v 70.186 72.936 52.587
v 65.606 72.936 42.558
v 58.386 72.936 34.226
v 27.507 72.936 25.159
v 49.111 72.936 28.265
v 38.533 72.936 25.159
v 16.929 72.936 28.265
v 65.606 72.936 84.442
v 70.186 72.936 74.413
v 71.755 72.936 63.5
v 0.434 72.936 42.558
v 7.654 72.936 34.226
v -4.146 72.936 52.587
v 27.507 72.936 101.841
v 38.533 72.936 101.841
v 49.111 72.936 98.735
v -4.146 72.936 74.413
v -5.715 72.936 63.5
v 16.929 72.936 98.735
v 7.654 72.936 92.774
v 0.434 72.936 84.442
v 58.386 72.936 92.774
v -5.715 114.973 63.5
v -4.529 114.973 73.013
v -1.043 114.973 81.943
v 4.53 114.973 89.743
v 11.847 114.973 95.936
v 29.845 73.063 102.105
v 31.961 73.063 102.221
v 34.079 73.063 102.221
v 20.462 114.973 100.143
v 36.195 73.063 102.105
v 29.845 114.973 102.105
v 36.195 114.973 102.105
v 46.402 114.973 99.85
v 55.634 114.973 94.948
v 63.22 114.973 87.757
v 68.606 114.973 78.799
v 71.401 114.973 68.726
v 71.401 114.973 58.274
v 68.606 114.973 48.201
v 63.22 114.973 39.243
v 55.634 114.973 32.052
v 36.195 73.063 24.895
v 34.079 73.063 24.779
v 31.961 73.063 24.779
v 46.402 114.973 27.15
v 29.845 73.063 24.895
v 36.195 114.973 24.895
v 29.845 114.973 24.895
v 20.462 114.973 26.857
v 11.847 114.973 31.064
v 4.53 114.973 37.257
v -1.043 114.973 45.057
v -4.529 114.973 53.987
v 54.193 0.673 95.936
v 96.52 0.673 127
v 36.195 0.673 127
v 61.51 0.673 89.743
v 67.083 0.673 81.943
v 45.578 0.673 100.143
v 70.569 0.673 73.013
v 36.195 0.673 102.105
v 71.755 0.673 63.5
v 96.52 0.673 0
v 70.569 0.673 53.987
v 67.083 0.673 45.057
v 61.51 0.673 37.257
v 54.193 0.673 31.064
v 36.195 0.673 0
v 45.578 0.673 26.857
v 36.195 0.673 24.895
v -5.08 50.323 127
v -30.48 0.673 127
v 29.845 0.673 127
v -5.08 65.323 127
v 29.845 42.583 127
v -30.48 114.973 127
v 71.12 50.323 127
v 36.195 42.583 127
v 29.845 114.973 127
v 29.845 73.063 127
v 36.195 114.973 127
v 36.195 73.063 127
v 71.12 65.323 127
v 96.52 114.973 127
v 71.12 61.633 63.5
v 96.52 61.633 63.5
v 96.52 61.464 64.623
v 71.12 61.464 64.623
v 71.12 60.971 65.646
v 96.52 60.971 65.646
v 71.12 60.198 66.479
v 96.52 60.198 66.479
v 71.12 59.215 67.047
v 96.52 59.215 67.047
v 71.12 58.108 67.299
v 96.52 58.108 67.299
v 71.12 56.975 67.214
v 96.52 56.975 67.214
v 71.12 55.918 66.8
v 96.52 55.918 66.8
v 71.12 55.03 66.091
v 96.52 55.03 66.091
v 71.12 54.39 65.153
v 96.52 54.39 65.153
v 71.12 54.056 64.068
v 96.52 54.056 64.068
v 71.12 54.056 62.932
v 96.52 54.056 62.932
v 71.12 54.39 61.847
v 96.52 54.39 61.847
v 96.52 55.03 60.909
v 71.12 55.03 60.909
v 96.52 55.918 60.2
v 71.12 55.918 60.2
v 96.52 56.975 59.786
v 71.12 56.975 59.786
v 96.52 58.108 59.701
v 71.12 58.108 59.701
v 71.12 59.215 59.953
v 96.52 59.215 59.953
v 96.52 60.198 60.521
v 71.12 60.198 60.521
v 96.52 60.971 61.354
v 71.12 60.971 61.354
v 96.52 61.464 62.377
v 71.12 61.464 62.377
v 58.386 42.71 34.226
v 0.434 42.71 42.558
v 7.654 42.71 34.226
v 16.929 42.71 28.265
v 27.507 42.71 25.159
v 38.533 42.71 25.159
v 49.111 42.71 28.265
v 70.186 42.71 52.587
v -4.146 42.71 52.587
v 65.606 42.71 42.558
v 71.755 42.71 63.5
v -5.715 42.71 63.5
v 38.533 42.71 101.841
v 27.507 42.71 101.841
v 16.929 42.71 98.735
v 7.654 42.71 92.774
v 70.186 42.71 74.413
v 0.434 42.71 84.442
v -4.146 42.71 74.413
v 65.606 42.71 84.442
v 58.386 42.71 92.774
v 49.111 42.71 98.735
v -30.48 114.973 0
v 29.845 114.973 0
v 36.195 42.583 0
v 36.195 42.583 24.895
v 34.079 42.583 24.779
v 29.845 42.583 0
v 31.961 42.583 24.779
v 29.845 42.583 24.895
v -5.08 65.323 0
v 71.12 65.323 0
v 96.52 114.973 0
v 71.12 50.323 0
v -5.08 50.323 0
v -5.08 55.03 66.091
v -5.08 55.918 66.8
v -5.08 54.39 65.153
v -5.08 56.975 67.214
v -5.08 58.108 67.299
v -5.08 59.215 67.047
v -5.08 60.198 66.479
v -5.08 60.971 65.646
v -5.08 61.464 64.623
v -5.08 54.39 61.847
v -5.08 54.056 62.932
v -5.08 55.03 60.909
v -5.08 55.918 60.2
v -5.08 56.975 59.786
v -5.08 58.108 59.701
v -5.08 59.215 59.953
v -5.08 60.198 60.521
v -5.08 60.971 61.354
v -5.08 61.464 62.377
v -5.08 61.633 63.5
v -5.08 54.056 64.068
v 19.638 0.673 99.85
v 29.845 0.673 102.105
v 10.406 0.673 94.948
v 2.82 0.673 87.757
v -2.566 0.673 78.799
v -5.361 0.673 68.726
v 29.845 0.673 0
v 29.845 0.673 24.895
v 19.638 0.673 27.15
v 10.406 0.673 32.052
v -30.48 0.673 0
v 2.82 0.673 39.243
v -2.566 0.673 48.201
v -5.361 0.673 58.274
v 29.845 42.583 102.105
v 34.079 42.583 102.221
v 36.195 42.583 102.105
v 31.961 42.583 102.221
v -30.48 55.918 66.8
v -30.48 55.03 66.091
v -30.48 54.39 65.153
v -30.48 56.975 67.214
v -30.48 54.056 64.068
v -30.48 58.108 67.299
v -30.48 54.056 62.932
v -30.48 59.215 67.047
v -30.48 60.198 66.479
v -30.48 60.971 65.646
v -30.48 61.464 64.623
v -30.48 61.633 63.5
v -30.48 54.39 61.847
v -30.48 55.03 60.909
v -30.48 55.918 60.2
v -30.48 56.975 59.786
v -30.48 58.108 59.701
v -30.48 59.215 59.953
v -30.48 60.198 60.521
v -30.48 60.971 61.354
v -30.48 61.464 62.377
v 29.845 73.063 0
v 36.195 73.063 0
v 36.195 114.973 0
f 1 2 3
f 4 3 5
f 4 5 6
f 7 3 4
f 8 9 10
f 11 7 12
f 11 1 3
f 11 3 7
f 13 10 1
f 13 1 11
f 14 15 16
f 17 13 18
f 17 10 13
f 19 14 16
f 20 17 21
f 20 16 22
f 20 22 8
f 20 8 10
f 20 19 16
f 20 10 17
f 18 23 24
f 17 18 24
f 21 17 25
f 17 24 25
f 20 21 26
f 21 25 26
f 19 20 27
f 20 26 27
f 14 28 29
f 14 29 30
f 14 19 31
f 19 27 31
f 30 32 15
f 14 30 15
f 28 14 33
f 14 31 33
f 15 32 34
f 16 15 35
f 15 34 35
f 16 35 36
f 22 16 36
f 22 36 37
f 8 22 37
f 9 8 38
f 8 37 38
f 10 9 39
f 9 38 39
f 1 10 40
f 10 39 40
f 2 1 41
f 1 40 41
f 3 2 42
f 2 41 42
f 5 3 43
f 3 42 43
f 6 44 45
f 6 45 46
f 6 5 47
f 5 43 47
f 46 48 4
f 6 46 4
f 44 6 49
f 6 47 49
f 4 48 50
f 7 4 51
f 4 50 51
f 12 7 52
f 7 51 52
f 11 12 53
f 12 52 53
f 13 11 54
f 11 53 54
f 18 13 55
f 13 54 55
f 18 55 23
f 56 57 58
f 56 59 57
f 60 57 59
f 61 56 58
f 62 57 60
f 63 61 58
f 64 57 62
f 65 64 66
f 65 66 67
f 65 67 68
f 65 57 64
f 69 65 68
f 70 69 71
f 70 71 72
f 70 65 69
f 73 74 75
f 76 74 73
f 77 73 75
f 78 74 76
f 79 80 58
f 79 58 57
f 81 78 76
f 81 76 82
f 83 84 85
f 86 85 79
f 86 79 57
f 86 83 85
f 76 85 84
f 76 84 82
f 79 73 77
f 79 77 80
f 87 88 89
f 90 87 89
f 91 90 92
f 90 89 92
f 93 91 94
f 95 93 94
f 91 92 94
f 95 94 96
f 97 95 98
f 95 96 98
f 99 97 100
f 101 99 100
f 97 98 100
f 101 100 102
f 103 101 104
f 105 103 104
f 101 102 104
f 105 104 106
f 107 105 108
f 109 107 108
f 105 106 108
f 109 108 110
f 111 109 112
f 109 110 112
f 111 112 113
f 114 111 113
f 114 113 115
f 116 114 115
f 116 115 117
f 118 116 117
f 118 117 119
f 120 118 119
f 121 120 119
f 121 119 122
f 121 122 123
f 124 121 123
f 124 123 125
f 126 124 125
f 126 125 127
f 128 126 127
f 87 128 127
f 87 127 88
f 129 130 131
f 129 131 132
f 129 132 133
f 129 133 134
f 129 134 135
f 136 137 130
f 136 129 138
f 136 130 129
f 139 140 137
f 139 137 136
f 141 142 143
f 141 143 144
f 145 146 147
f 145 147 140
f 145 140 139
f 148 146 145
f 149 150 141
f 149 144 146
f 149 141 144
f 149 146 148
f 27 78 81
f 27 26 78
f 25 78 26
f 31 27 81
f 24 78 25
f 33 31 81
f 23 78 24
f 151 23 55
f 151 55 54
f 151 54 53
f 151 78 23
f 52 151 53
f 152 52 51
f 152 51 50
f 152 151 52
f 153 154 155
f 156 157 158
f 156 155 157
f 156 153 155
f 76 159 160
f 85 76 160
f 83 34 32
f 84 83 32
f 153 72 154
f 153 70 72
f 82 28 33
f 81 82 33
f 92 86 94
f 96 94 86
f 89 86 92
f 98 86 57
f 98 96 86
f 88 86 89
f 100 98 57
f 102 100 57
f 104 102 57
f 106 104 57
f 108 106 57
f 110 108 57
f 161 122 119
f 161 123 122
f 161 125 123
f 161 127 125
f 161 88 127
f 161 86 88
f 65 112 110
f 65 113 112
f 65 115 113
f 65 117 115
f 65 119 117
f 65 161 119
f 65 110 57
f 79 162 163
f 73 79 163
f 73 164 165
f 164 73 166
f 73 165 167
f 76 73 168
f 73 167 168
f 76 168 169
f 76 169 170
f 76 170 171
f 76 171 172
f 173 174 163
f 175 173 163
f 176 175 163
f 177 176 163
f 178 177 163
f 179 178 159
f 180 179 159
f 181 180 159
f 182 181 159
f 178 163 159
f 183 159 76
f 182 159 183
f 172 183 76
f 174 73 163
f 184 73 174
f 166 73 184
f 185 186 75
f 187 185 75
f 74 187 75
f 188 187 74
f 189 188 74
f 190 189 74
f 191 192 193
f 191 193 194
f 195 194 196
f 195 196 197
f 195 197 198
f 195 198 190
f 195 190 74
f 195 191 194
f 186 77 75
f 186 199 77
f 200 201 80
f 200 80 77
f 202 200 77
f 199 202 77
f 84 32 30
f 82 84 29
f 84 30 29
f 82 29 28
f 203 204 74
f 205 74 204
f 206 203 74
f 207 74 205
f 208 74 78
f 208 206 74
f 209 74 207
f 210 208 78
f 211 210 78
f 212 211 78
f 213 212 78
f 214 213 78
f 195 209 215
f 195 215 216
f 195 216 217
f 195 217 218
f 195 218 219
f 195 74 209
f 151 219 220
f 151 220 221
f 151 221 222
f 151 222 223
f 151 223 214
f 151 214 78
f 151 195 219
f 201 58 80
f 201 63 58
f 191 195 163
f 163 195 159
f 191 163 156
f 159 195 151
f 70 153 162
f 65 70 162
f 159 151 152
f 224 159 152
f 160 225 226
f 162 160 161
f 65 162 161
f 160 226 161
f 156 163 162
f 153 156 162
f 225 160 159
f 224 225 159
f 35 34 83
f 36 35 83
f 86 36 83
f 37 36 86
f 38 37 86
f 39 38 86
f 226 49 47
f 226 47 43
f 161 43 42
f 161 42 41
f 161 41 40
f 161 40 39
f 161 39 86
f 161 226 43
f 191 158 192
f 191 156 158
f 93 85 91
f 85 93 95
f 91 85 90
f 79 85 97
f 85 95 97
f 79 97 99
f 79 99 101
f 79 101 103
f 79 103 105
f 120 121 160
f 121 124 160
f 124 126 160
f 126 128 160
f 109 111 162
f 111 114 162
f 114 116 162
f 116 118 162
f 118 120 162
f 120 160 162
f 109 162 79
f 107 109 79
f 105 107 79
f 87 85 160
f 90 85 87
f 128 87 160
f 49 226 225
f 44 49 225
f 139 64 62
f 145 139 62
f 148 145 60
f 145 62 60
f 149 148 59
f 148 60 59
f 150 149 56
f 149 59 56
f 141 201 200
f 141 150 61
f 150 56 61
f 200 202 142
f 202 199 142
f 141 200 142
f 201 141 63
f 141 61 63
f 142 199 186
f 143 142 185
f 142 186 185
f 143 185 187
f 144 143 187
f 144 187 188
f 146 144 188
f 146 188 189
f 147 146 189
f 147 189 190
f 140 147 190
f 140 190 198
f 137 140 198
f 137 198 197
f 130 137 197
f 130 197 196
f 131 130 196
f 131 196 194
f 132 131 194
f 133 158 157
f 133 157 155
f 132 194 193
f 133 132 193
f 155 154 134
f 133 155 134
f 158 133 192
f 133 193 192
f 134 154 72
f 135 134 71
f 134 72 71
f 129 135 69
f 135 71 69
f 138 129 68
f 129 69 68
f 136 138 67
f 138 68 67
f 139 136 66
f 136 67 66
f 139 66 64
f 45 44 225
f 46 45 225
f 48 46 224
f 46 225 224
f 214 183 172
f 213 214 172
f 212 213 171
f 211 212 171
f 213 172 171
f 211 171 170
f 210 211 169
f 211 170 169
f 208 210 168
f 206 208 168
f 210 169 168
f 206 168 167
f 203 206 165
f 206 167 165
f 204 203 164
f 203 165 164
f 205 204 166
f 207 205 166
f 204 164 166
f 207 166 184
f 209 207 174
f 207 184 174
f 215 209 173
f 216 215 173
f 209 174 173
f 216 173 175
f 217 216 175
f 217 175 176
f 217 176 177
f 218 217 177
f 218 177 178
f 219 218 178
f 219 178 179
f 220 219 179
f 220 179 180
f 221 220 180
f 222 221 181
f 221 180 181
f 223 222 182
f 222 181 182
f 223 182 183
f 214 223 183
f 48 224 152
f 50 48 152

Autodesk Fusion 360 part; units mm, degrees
sketch "Sketch1" plane through (0, 0, 0) normal (0, 0, 1) x (1, 0, 0)
  line L0 (-30.48, 114.973) -> (96.52, 114.973)
  line L1 (96.52, 114.973) -> (96.52, 0.673)
  line L2 (96.52, 0.673) -> (-30.48, 0.673)
  line L3 (-30.48, 0.673) -> (-30.48, 114.973)
  line L4 (-5.08, 65.323) -> (71.12, 65.323)
  line L5 (71.12, 65.323) -> (71.12, 50.323)
  line L6 (71.12, 50.323) -> (-5.08, 50.323)
  line L7 (-5.08, 50.323) -> (-5.08, 65.323)
  line L8 (29.845, 114.973) -> (36.195, 114.973)
  line L9 (36.195, 114.973) -> (36.195, 73.063)
  line L10 (36.195, 73.063) -> (29.845, 73.063)
  line L11 (29.845, 73.063) -> (29.845, 114.973)
  line L12 (29.845, 0.673) -> (36.195, 0.673)
  line L13 (36.195, 0.673) -> (36.195, 42.583)
  line L14 (36.195, 42.583) -> (29.845, 42.583)
  line L15 (29.845, 42.583) -> (29.845, 0.673)
  dimension "d1" = 114.3
  dimension "d2" = 127
  dimension "d3" = 15
  dimension "d4" = 76.2
  dimension "d5" = 25.4
  dimension "d8" = 49.65
  dimension "d9" = 6.35
  dimension "d10" = 60.325
  dimension "d11" = 41.91
  dimension "d12" = 41.91
  dimension "d13" = 60.325
  dimension "d14" = 6.35
extrude "Extrude1" add sketch "Sketch1" along normal blind 127 contours L0 L1 L2 L3 L9 L10 L11 L13 L14 L15
sketch "Sketch2" plane through (0, 0.673, 0) normal (0, -1, 0) x (1, 0, 0)
  line L0 (-30.48, 0) -> (29.845, 0)
  line L1 (29.845, 0) -> (29.845, 127)
  line L2 (29.845, 127) -> (-30.48, 127)
  line L3 (-30.48, 127) -> (-30.48, 0)
  circle A0 centre (33.02, 63.5) radius 38.735
  dimension "d17" = 77.47
  dimension "d18" = 63.5
  dimension "d19" = 63.5
extrude "Extrude2" cut sketch "Sketch2" against normal blind 42.037 contours L1 A0 | L1 A0
sketch "Sketch3" plane through (0, 114.973, 0) normal (0, 1, 0) x (-1, 0, 0)
  line L0 (-29.845, 0) -> (30.48, 0)
  line L1 (30.48, 0) -> (30.48, 127)
  line L2 (30.48, 127) -> (-29.845, 127)
  line L3 (-29.845, 127) -> (-29.845, 0)
  circle A0 centre (-33.02, 63.5) radius 38.735
  dimension "d22" = 77.47
  dimension "d23" = 63.5
  dimension "d24" = 63.5
extrude "Extrude3" cut sketch "Sketch3" against normal blind 42.037 contours L3 A0 | L3 A0
sketch "Sketch4" plane through (96.52, 0, 0) normal (1, 0, 0) x (0, 1, 0)
  line L0 (0.673, 0) -> (114.973, 0)
  line L1 (114.973, 0) -> (114.973, 127)
  line L2 (114.973, 127) -> (0.673, 127)
  line L3 (0.673, 127) -> (0.673, 0)
  circle A0 centre (57.823, 63.5) radius 3.81
  dimension "d39" = 7.62
  dimension "d40" = 63.5
  dimension "d41" = 57.15
extrude "Extrude4" cut sketch "Sketch4" against normal blind 127 contours A0
